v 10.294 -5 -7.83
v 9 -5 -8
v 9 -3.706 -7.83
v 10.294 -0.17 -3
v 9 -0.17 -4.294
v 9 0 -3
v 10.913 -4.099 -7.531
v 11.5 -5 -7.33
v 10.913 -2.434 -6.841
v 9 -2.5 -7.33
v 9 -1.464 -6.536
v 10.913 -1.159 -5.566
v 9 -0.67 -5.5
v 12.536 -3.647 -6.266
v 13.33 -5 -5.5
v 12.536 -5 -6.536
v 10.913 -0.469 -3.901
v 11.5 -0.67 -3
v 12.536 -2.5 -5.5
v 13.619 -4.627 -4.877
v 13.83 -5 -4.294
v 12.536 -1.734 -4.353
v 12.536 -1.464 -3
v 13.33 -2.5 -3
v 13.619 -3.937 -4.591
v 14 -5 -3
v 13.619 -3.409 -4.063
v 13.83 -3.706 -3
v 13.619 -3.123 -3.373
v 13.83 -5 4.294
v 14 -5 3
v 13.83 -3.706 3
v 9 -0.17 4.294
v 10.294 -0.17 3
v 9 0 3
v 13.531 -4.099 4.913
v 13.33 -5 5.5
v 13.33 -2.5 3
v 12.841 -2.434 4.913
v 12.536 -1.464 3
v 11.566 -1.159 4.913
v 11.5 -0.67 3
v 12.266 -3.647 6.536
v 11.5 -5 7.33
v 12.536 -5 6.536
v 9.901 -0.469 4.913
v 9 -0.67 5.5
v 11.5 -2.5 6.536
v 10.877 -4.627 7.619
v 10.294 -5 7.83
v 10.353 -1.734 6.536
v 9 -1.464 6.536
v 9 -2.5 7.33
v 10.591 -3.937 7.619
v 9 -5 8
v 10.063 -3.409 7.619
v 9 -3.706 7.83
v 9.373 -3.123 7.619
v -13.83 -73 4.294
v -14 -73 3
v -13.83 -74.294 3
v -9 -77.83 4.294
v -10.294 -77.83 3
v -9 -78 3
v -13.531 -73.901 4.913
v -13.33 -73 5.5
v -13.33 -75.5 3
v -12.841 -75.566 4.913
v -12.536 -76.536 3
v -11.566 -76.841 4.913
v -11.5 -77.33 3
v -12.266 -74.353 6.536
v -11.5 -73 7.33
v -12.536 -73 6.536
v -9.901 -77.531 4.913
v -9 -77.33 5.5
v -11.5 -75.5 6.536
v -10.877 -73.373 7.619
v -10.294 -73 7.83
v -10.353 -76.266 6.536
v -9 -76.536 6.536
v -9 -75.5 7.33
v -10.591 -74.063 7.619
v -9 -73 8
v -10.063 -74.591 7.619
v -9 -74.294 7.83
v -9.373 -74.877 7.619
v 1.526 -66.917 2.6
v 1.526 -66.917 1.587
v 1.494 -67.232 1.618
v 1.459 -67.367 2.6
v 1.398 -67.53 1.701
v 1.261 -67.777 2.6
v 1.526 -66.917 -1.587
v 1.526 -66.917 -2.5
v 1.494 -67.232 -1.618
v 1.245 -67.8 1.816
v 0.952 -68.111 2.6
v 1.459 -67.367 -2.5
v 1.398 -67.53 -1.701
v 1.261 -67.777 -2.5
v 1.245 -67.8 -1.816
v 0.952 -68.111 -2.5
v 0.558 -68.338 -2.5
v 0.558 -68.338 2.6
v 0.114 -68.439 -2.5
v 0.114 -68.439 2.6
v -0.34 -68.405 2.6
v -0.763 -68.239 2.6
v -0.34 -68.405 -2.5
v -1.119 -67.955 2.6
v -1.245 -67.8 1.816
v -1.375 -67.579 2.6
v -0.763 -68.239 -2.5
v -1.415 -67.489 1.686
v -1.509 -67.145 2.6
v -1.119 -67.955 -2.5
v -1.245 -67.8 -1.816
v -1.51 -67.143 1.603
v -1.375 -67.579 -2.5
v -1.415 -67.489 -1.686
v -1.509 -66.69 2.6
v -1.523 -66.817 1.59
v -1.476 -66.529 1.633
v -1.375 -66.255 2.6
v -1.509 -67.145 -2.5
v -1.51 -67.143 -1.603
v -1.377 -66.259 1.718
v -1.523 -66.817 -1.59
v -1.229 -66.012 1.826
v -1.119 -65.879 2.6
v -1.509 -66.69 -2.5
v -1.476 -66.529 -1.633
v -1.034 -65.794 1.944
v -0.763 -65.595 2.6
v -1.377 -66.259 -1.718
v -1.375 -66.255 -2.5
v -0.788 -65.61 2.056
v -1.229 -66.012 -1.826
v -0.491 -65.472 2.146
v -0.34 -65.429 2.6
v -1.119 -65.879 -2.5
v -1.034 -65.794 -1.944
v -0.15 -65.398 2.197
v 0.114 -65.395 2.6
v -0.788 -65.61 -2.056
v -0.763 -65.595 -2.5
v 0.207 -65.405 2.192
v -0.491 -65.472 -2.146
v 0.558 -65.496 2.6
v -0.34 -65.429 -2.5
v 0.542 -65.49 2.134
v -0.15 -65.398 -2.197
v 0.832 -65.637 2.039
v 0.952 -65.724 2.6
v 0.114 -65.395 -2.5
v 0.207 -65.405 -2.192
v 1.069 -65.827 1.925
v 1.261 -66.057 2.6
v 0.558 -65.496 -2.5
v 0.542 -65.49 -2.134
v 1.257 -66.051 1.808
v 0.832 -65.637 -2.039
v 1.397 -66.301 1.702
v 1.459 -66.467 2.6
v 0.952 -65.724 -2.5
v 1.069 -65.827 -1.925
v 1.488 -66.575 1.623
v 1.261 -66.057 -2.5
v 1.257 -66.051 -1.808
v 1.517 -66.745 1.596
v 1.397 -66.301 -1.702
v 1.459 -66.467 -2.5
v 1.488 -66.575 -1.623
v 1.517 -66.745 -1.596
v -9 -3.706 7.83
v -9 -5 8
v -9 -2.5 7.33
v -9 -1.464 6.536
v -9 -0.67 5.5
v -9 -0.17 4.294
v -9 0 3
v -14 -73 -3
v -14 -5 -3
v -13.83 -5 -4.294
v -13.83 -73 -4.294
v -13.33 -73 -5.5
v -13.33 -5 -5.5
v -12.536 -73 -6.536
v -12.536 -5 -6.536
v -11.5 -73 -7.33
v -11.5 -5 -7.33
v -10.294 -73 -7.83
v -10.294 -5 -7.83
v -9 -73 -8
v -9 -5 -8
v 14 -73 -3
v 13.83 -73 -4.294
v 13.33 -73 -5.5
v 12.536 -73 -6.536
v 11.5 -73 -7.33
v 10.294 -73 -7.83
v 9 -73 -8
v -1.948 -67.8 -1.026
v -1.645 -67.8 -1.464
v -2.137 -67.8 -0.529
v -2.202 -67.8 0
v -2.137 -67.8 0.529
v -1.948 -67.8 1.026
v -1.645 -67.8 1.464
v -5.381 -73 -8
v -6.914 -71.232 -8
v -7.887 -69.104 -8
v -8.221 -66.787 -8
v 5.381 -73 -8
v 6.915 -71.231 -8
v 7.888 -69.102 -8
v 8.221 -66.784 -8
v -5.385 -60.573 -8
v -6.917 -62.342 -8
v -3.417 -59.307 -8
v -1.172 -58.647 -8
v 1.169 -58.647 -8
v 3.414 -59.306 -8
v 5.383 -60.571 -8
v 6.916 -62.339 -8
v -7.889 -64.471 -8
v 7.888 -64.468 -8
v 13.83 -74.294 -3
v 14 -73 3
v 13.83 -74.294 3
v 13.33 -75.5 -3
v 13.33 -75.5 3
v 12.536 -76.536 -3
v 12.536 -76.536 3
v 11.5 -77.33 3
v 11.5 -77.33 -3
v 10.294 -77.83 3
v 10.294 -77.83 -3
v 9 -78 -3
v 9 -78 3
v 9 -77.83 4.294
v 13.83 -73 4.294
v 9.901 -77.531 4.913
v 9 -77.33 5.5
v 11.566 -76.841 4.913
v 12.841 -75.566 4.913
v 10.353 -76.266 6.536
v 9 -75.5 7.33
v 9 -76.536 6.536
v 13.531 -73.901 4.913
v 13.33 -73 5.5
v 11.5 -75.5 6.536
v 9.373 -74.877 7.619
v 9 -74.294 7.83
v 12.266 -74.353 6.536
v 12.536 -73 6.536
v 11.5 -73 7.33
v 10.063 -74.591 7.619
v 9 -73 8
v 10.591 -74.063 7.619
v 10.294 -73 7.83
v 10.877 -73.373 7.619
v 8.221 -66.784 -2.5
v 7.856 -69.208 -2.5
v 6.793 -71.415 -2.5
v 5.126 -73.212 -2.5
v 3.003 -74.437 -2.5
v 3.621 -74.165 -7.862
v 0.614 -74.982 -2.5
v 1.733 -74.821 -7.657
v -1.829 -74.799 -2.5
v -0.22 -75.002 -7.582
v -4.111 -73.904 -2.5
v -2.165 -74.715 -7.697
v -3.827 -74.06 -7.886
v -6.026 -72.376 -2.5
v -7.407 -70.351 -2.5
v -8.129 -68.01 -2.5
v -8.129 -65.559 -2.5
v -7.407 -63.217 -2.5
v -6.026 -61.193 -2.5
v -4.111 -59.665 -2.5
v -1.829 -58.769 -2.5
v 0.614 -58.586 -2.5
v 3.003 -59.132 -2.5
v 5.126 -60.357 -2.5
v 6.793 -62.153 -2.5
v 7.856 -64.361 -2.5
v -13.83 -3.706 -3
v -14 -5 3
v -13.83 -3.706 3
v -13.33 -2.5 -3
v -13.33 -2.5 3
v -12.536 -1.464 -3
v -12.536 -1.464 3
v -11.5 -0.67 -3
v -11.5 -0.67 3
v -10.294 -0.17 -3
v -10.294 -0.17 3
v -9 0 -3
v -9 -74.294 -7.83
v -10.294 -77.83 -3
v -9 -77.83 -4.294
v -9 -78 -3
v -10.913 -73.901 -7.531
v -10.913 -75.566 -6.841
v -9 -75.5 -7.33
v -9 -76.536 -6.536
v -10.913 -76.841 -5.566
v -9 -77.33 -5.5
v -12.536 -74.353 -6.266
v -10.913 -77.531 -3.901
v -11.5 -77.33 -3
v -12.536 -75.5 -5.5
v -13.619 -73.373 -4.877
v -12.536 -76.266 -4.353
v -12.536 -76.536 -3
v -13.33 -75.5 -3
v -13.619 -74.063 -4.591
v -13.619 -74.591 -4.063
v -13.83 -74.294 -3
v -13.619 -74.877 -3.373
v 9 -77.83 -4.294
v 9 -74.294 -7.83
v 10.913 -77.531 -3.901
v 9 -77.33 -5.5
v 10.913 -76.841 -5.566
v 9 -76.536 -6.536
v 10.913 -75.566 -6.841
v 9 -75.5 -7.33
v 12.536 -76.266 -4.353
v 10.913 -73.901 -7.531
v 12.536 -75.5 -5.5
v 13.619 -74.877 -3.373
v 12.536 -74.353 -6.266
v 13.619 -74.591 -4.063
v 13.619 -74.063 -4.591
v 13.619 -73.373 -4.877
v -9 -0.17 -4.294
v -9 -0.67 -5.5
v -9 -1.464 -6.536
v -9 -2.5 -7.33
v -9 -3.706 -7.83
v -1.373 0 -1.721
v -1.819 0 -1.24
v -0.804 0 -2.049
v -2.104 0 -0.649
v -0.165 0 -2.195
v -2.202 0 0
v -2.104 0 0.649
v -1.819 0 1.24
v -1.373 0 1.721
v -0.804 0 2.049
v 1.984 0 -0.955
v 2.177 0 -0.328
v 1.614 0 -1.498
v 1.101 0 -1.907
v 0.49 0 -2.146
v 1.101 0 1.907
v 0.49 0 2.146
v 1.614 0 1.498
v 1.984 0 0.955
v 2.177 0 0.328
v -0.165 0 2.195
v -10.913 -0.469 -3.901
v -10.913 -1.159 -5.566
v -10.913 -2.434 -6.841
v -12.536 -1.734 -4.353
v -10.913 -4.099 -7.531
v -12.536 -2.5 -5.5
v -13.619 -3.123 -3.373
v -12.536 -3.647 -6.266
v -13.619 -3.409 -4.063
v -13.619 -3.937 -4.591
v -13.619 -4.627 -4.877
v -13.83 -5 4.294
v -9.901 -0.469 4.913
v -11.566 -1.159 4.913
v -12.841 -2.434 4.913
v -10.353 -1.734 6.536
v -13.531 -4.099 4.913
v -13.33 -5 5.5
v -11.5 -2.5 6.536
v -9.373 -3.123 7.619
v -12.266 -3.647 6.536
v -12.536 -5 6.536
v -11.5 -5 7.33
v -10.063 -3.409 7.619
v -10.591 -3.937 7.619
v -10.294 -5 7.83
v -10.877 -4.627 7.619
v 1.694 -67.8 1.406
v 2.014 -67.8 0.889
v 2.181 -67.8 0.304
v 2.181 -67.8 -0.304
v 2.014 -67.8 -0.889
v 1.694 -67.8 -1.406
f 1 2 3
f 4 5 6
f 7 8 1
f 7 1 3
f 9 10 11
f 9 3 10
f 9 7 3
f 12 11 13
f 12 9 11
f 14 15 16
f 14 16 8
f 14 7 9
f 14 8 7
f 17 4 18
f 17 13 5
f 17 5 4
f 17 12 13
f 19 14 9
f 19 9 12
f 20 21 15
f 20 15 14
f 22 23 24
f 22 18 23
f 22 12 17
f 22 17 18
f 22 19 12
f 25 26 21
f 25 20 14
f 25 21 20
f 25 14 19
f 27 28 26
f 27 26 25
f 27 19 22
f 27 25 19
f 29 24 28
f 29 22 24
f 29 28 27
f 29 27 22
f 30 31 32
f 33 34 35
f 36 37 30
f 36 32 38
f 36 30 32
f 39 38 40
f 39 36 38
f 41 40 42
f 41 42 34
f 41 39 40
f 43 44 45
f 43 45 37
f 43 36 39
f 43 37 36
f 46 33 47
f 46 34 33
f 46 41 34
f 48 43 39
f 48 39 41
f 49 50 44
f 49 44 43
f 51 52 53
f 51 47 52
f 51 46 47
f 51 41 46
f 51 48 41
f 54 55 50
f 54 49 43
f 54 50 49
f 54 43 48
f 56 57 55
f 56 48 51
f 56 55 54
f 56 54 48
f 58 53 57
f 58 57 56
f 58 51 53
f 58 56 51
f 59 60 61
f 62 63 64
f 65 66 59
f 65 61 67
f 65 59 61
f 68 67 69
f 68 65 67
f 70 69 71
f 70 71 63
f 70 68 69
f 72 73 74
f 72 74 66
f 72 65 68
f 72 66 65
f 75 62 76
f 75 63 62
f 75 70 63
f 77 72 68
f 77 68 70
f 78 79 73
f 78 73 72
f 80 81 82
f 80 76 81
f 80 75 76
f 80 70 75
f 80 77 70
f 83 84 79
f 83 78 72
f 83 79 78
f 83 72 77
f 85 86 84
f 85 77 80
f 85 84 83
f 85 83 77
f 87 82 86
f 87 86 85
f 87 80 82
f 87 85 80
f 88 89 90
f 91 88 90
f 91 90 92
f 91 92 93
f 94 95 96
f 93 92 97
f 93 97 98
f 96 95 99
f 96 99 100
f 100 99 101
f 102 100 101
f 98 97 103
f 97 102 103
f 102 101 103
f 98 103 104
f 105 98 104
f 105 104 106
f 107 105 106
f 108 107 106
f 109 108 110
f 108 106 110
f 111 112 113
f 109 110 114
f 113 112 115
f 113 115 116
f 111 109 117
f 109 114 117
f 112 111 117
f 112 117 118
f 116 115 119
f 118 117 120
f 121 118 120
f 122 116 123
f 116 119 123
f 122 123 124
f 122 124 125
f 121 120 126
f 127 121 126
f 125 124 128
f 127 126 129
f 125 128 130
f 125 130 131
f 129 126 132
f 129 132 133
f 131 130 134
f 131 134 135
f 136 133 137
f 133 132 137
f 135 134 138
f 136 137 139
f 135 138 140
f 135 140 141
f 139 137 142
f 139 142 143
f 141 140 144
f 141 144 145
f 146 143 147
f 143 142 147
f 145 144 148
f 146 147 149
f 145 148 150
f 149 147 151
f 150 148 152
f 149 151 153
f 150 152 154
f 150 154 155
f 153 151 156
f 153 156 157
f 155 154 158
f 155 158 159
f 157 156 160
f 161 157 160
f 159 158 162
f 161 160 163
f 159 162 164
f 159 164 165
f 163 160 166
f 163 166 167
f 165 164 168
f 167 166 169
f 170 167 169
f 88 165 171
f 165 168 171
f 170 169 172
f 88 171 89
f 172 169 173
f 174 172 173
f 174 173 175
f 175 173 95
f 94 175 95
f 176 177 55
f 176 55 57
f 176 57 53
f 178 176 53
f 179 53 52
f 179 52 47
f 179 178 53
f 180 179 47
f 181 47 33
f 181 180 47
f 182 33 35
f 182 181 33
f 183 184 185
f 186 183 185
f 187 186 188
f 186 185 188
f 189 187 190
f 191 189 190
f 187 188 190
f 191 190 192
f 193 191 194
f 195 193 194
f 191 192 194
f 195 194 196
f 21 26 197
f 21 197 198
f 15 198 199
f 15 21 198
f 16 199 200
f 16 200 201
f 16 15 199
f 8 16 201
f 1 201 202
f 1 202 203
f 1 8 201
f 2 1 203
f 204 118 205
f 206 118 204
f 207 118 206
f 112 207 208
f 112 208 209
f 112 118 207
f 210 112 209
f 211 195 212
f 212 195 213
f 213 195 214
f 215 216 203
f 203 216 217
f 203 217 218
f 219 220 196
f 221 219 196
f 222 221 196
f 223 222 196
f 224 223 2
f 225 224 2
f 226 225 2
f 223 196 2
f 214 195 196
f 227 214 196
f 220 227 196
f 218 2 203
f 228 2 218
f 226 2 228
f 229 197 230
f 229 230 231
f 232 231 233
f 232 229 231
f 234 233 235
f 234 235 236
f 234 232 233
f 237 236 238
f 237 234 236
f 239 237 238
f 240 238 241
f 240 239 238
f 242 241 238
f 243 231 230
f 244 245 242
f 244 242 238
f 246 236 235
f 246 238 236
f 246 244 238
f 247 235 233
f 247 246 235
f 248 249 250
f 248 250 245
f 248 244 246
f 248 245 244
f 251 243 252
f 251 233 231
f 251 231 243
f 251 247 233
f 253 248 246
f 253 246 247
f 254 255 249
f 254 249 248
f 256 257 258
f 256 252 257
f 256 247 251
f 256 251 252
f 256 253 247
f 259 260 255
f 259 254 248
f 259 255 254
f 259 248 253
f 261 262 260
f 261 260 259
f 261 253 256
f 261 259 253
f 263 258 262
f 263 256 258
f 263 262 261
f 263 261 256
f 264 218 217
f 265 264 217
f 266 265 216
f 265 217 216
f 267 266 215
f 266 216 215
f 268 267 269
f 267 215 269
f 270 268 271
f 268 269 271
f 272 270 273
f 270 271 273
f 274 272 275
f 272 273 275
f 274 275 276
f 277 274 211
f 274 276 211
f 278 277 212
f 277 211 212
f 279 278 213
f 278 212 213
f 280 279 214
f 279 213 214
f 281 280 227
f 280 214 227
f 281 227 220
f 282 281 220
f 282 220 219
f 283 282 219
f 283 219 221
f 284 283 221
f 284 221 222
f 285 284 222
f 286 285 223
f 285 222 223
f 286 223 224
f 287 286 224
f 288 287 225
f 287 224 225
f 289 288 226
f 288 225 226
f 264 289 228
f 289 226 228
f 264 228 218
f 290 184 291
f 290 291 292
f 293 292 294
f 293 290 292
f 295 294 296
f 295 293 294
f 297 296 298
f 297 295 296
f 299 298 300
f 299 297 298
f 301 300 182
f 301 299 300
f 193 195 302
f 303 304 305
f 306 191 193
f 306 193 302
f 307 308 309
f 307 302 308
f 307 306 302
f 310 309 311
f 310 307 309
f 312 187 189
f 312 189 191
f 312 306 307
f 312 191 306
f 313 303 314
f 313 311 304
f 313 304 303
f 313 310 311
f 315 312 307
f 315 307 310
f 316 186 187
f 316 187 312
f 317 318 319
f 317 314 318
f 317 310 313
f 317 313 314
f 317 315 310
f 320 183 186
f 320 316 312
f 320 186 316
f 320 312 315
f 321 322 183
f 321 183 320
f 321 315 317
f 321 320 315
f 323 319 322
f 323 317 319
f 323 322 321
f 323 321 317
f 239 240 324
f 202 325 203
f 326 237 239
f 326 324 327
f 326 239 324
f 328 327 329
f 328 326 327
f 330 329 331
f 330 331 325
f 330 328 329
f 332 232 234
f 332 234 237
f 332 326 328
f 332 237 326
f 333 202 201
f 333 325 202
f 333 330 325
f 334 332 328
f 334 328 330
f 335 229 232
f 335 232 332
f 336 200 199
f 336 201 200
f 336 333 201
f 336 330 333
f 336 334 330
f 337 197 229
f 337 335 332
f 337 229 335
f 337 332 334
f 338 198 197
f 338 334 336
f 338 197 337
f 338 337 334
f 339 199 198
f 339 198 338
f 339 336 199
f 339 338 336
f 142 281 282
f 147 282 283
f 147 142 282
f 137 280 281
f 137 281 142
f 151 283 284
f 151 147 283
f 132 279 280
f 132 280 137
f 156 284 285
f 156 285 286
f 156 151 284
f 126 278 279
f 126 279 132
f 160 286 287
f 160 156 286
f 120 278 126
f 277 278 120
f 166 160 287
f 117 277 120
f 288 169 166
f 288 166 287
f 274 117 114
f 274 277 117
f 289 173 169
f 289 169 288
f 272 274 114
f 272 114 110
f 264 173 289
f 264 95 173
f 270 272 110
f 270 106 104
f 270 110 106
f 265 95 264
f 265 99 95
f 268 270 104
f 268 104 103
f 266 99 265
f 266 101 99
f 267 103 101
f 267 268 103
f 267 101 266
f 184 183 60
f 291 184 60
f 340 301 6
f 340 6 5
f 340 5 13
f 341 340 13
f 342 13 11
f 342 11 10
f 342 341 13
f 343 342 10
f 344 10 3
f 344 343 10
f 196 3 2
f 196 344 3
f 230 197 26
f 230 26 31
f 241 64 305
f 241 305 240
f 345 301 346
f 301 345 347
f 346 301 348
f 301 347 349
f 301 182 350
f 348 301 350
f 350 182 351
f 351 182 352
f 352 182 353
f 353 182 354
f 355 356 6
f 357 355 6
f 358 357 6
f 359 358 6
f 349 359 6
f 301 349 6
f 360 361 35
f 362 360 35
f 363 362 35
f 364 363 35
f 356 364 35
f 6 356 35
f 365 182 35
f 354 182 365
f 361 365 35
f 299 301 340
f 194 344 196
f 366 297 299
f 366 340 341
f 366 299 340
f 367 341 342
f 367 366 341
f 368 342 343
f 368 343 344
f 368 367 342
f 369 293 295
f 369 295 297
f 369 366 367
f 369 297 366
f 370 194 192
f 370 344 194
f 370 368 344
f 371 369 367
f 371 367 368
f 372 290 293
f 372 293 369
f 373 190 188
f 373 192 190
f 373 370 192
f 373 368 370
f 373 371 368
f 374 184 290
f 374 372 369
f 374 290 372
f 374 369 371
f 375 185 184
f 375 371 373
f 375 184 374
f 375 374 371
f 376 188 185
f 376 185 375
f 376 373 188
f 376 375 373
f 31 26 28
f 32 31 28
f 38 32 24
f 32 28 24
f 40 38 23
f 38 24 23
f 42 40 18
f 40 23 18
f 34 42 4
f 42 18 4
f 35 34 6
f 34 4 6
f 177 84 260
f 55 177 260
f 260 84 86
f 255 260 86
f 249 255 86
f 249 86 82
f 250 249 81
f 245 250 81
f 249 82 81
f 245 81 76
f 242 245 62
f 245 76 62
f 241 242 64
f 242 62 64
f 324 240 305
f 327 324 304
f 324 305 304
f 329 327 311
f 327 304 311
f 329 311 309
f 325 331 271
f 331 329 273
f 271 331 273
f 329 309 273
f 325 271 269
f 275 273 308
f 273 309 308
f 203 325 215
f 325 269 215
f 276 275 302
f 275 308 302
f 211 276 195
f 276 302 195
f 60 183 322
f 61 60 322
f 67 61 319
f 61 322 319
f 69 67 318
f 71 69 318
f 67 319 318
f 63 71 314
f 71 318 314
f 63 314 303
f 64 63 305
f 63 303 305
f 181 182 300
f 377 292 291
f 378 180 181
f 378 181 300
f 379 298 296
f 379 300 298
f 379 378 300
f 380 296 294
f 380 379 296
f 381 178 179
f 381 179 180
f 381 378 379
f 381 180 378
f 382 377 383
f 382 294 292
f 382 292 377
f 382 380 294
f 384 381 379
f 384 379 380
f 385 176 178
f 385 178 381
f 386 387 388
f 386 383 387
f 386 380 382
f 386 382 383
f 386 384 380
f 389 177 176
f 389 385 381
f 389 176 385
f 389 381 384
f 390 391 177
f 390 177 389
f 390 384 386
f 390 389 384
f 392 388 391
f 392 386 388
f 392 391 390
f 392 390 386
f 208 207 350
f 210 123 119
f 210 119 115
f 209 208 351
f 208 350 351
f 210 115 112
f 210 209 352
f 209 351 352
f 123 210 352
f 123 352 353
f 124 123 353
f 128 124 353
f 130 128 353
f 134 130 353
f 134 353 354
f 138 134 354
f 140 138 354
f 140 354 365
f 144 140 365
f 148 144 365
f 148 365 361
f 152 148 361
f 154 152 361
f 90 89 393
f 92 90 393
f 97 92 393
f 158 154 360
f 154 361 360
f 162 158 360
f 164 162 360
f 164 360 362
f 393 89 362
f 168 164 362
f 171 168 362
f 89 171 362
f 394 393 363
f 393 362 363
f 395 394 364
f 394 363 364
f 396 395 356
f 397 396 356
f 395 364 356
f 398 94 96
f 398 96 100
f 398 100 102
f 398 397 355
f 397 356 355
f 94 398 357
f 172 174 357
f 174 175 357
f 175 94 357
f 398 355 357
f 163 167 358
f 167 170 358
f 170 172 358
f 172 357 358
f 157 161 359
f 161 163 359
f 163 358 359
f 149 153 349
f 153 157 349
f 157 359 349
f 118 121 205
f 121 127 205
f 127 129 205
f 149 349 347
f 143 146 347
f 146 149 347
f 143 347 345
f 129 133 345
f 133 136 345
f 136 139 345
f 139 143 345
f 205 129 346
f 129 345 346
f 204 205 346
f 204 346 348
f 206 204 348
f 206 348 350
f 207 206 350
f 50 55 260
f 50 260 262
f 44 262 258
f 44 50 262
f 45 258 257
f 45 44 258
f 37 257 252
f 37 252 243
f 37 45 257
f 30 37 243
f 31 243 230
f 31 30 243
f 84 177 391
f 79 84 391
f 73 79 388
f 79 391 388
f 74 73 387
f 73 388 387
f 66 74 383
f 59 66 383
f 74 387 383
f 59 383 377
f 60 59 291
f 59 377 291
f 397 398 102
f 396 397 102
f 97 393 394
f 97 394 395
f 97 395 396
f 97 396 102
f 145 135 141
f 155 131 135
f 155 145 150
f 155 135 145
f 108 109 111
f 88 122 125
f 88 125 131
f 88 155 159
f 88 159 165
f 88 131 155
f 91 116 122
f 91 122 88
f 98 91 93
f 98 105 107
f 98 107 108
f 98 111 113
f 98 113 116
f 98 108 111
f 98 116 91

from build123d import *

# Parameters (mm, degrees)
F0_W         = 28
F0_H         = 16
F1_DEPTH     = 78
F2_R         = 2.2016502053
F4_DEPTH     = 67.8
F5_R         = 1.5264270503
F6_DEPTH     = 10.6
F3_R         = 8.2210139084
F7_DEPTH     = 5.5
F8_T1_DEPTH  = 68
F8_T3_DEPTH  = 18
F8_T5_DEPTH  = 6
F8_S9_W      = 5
F8_S9_H      = 5
F8_T10_DEPTH = 5
F8_S15_W     = 5
F8_S15_H     = 5
F8_T16_DEPTH = 5
F8_S21_W     = 5
F8_S21_H     = 5
F8_T22_DEPTH = 5
F8_S27_W     = 5
F8_S27_H     = 5
F8_T28_DEPTH = 5
F8_S33_W     = 5
F8_S33_H     = 5
F8_T34_DEPTH = 5
F8_S39_W     = 5
F8_S39_H     = 5
F8_T40_DEPTH = 5
F8_S45_W     = 5
F8_S45_H     = 5
F8_T46_DEPTH = 5
F8_S51_W     = 5
F8_S51_H     = 5
F8_T52_DEPTH = 5


# Not quite as in the source:
# - a fillet or chamfer that OpenCascade refuses, or shapes differently, is made with other operations: its cross-section is extruded or revolved along the edge and cut away or added


with BuildPart() as f1:
    # F0 (on Front) → F1 (new body)
    with BuildSketch(Plane.XZ):
        Rectangle(F0_W, F0_H)
    extrude(amount=F1_DEPTH)

    # F2 (on face) → F4 (cut)
    with BuildSketch(Plane(origin=(0, 0, 0), x_dir=(-1, 0, 0), z_dir=(0, 1, 0))):
        Circle(F2_R)
    extrude(amount=-F4_DEPTH, mode=Mode.SUBTRACT)

    # F5 (on face) → F6 (cut)
    with BuildSketch(Plane(origin=(0, 0, -8), x_dir=(1, 0, 0), z_dir=(0, 0, -1))):
        with Locations((0, 66.9171065092)):
            Circle(F5_R)
    extrude(amount=-F6_DEPTH, mode=Mode.SUBTRACT)

    # F3 (on face) → F7 (cut)
    with BuildSketch(Plane(origin=(0, 0, -8), x_dir=(1, 0, 0), z_dir=(0, 0, -1))):
        with Locations((0, 66.784389317)):
            Circle(F3_R)
    extrude(amount=-F7_DEPTH, mode=Mode.SUBTRACT)

    # F8: fillet of radius 5 on 12 edges, made by hand

    # F8_s2 → F8_t1 (cut)
    with BuildSketch(Plane.XZ.offset(5)):
        with BuildLine():
            ThreePointArc((-14, -3), (-12.5355339059, -6.5355339059), (-9, -8))
            Line((-9, -8), (-14, -8))
            Line((-14, -8), (-14, -3))
        make_face()
        with BuildLine():
            ThreePointArc((14, -3), (12.5355339059, -6.5355339059), (9, -8))
            Line((9, -8), (14, -8))
            Line((14, -8), (14, -3))
        make_face()
        with BuildLine():
            ThreePointArc((9, 8), (12.5355339059, 6.5355339059), (14, 3))
            Line((14, 3), (14, 8))
            Line((14, 8), (9, 8))
        make_face()
        with BuildLine():
            ThreePointArc((-9, 8), (-12.5355339059, 6.5355339059), (-14, 3))
            Line((-14, 3), (-14, 8))
            Line((-14, 8), (-9, 8))
        make_face()
    extrude(amount=F8_T1_DEPTH, mode=Mode.SUBTRACT)

    # F8_s4 → F8_t3 (cut)
    with BuildSketch(Plane.YZ.offset(-9)):
        with BuildLine():
            ThreePointArc((-78, -3), (-76.5355339059, -6.5355339059), (-73, -8))
            Line((-73, -8), (-78, -8))
            Line((-78, -8), (-78, -3))
        make_face()
        with BuildLine():
            ThreePointArc((0, -3), (-1.4644660941, -6.5355339059), (-5, -8))
            Line((-5, -8), (0, -8))
            Line((0, -8), (0, -3))
        make_face()
        with BuildLine():
            ThreePointArc((-5, 8), (-1.4644660941, 6.5355339059), (0, 3))
            Line((0, 3), (0, 8))
            Line((0, 8), (-5, 8))
        make_face()
        with BuildLine():
            ThreePointArc((-73, 8), (-76.5355339059, 6.5355339059), (-78, 3))
            Line((-78, 3), (-78, 8))
            Line((-78, 8), (-73, 8))
        make_face()
    extrude(amount=F8_T3_DEPTH, mode=Mode.SUBTRACT)

    # F8_s6 → F8_t5 (cut)
    with BuildSketch(Plane.XY.offset(-3)):
        with BuildLine():
            ThreePointArc((14, -73), (12.5355339059, -76.5355339059), (9, -78))
            Line((9, -78), (14, -78))
            Line((14, -78), (14, -73))
        make_face()
        with BuildLine():
            ThreePointArc((-14, -73), (-12.5355339059, -76.5355339059), (-9, -78))
            Line((-9, -78), (-14, -78))
            Line((-14, -78), (-14, -73))
        make_face()
        with BuildLine():
            ThreePointArc((-14, -5), (-12.5355339059, -1.4644660941), (-9, 0))
            Line((-9, 0), (-14, 0))
            Line((-14, 0), (-14, -5))
        make_face()
        with BuildLine():
            ThreePointArc((14, -5), (12.5355339059, -1.4644660941), (9, 0))
            Line((9, 0), (14, 0))
            Line((14, 0), (14, -5))
        make_face()
    extrude(amount=F8_T5_DEPTH, mode=Mode.SUBTRACT)


with BuildPart() as f8_tool8:
    # F8_s9 → F8_t10 (new body)
    with BuildSketch(Plane.YZ.offset(-9)):
        with Locations((-2.5, -5.5)):
            Rectangle(F8_S9_W, F8_S9_H)
    extrude(amount=-F8_T10_DEPTH)

    # F8_s11 → F8_t12 (revolve, cut)
    with BuildSketch(Plane(origin=(-9, -5, -3), x_dir=(0, -0.7071067812, 0.7071067812), z_dir=(0, -0.7071067812, -0.7071067812))):
        with BuildLine():
            ThreePointArc((0, -5), (5, 0), (0, 5))
            Line((0, 5), (0, -5))
        make_face()
    revolve(axis=Axis((-9, -5, -3), (-1, 0, 0)), mode=Mode.SUBTRACT)


with BuildPart() as f1_1:
    add(f1.part)

    # F8_t7: cut F8_tool8
    add(f8_tool8.part, mode=Mode.SUBTRACT)


with BuildPart() as f8_tool14:
    # F8_s15 → F8_t16 (new body)
    with BuildSketch(Plane.YZ.offset(-9)):
        with Locations((-75.5, -5.5)):
            Rectangle(F8_S15_W, F8_S15_H)
    extrude(amount=-F8_T16_DEPTH)

    # F8_s17 → F8_t18 (revolve, cut)
    with BuildSketch(Plane(origin=(-9, -73, -3), x_dir=(0, 0.7071067812, 0.7071067812), z_dir=(0, -0.7071067812, 0.7071067812))):
        with BuildLine():
            ThreePointArc((0, -5), (5, 0), (0, 5))
            Line((0, 5), (0, -5))
        make_face()
    revolve(axis=Axis((-9, -73, -3), (-1, 0, 0)), mode=Mode.SUBTRACT)


with BuildPart() as f1_2:
    add(f1_1.part)

    # F8_t13: cut F8_tool14
    add(f8_tool14.part, mode=Mode.SUBTRACT)


with BuildPart() as f8_tool20:
    # F8_s21 → F8_t22 (new body)
    with BuildSketch(Plane.YZ.offset(9)):
        with Locations((-75.5, -5.5)):
            Rectangle(F8_S21_W, F8_S21_H)
    extrude(amount=F8_T22_DEPTH)

    # F8_s23 → F8_t24 (revolve, cut)
    with BuildSketch(Plane(origin=(9, -73, -3), x_dir=(0, 0.7071067812, 0.7071067812), z_dir=(0, 0.7071067812, -0.7071067812))):
        with BuildLine():
            ThreePointArc((0, -5), (5, 0), (0, 5))
            Line((0, 5), (0, -5))
        make_face()
    revolve(axis=Axis((9, -73, -3), (1, 0, 0)), mode=Mode.SUBTRACT)


with BuildPart() as f1_3:
    add(f1_2.part)

    # F8_t19: cut F8_tool20
    add(f8_tool20.part, mode=Mode.SUBTRACT)


with BuildPart() as f8_tool26:
    # F8_s27 → F8_t28 (new body)
    with BuildSketch(Plane.YZ.offset(9)):
        with Locations((-2.5, -5.5)):
            Rectangle(F8_S27_W, F8_S27_H)
    extrude(amount=F8_T28_DEPTH)

    # F8_s29 → F8_t30 (revolve, cut)
    with BuildSketch(Plane(origin=(9, -5, -3), x_dir=(0, -0.7071067812, 0.7071067812), z_dir=(0, 0.7071067812, 0.7071067812))):
        with BuildLine():
            ThreePointArc((0, -5), (5, 0), (0, 5))
            Line((0, 5), (0, -5))
        make_face()
    revolve(axis=Axis((9, -5, -3), (1, 0, 0)), mode=Mode.SUBTRACT)


with BuildPart() as f1_4:
    add(f1_3.part)

    # F8_t25: cut F8_tool26
    add(f8_tool26.part, mode=Mode.SUBTRACT)


with BuildPart() as f8_tool32:
    # F8_s33 → F8_t34 (new body)
    with BuildSketch(Plane.XY.offset(3)):
        with Locations((11.5, -2.5)):
            Rectangle(F8_S33_W, F8_S33_H)
    extrude(amount=F8_T34_DEPTH)

    # F8_s35 → F8_t36 (revolve, cut)
    with BuildSketch(Plane(origin=(9, -5, 3), x_dir=(-0.7071067812, -0.7071067812, 0), z_dir=(-0.7071067812, 0.7071067812, 0))):
        with BuildLine():
            ThreePointArc((0, -5), (5, 0), (0, 5))
            Line((0, 5), (0, -5))
        make_face()
    revolve(axis=Axis((9, -5, 3), (0, 0, 1)), mode=Mode.SUBTRACT)


with BuildPart() as f1_5:
    add(f1_4.part)

    # F8_t31: cut F8_tool32
    add(f8_tool32.part, mode=Mode.SUBTRACT)


with BuildPart() as f8_tool38:
    # F8_s39 → F8_t40 (new body)
    with BuildSketch(Plane.XY.offset(3)):
        with Locations((-11.5, -2.5)):
            Rectangle(F8_S39_W, F8_S39_H)
    extrude(amount=F8_T40_DEPTH)

    # F8_s41 → F8_t42 (revolve, cut)
    with BuildSketch(Plane(origin=(-9, -5, 3), x_dir=(0.7071067812, -0.7071067812, 0), z_dir=(-0.7071067812, -0.7071067812, 0))):
        with BuildLine():
            ThreePointArc((0, -5), (5, 0), (0, 5))
            Line((0, 5), (0, -5))
        make_face()
    revolve(axis=Axis((-9, -5, 3), (0, 0, 1)), mode=Mode.SUBTRACT)


with BuildPart() as f1_6:
    add(f1_5.part)

    # F8_t37: cut F8_tool38
    add(f8_tool38.part, mode=Mode.SUBTRACT)


with BuildPart() as f8_tool44:
    # F8_s45 → F8_t46 (new body)
    with BuildSketch(Plane.XY.offset(3)):
        with Locations((11.5, -75.5)):
            Rectangle(F8_S45_W, F8_S45_H)
    extrude(amount=F8_T46_DEPTH)

    # F8_s47 → F8_t48 (revolve, cut)
    with BuildSketch(Plane(origin=(9, -73, 3), x_dir=(-0.7071067812, 0.7071067812, 0), z_dir=(0.7071067812, 0.7071067812, 0))):
        with BuildLine():
            ThreePointArc((0, -5), (5, 0), (0, 5))
            Line((0, 5), (0, -5))
        make_face()
    revolve(axis=Axis((9, -73, 3), (0, 0, 1)), mode=Mode.SUBTRACT)


with BuildPart() as f1_7:
    add(f1_6.part)

    # F8_t43: cut F8_tool44
    add(f8_tool44.part, mode=Mode.SUBTRACT)


with BuildPart() as f8_tool50:
    # F8_s51 → F8_t52 (new body)
    with BuildSketch(Plane.XY.offset(3)):
        with Locations((-11.5, -75.5)):
            Rectangle(F8_S51_W, F8_S51_H)
    extrude(amount=F8_T52_DEPTH)

    # F8_s53 → F8_t54 (revolve, cut)
    with BuildSketch(Plane(origin=(-9, -73, 3), x_dir=(0.7071067812, 0.7071067812, 0), z_dir=(0.7071067812, -0.7071067812, 0))):
        with BuildLine():
            ThreePointArc((0, -5), (5, 0), (0, 5))
            Line((0, 5), (0, -5))
        make_face()
    revolve(axis=Axis((-9, -73, 3), (0, 0, 1)), mode=Mode.SUBTRACT)


with BuildPart() as f1_8:
    add(f1_7.part)

    # F8_t49: cut F8_tool50
    add(f8_tool50.part, mode=Mode.SUBTRACT)


solid = f1_8.part
